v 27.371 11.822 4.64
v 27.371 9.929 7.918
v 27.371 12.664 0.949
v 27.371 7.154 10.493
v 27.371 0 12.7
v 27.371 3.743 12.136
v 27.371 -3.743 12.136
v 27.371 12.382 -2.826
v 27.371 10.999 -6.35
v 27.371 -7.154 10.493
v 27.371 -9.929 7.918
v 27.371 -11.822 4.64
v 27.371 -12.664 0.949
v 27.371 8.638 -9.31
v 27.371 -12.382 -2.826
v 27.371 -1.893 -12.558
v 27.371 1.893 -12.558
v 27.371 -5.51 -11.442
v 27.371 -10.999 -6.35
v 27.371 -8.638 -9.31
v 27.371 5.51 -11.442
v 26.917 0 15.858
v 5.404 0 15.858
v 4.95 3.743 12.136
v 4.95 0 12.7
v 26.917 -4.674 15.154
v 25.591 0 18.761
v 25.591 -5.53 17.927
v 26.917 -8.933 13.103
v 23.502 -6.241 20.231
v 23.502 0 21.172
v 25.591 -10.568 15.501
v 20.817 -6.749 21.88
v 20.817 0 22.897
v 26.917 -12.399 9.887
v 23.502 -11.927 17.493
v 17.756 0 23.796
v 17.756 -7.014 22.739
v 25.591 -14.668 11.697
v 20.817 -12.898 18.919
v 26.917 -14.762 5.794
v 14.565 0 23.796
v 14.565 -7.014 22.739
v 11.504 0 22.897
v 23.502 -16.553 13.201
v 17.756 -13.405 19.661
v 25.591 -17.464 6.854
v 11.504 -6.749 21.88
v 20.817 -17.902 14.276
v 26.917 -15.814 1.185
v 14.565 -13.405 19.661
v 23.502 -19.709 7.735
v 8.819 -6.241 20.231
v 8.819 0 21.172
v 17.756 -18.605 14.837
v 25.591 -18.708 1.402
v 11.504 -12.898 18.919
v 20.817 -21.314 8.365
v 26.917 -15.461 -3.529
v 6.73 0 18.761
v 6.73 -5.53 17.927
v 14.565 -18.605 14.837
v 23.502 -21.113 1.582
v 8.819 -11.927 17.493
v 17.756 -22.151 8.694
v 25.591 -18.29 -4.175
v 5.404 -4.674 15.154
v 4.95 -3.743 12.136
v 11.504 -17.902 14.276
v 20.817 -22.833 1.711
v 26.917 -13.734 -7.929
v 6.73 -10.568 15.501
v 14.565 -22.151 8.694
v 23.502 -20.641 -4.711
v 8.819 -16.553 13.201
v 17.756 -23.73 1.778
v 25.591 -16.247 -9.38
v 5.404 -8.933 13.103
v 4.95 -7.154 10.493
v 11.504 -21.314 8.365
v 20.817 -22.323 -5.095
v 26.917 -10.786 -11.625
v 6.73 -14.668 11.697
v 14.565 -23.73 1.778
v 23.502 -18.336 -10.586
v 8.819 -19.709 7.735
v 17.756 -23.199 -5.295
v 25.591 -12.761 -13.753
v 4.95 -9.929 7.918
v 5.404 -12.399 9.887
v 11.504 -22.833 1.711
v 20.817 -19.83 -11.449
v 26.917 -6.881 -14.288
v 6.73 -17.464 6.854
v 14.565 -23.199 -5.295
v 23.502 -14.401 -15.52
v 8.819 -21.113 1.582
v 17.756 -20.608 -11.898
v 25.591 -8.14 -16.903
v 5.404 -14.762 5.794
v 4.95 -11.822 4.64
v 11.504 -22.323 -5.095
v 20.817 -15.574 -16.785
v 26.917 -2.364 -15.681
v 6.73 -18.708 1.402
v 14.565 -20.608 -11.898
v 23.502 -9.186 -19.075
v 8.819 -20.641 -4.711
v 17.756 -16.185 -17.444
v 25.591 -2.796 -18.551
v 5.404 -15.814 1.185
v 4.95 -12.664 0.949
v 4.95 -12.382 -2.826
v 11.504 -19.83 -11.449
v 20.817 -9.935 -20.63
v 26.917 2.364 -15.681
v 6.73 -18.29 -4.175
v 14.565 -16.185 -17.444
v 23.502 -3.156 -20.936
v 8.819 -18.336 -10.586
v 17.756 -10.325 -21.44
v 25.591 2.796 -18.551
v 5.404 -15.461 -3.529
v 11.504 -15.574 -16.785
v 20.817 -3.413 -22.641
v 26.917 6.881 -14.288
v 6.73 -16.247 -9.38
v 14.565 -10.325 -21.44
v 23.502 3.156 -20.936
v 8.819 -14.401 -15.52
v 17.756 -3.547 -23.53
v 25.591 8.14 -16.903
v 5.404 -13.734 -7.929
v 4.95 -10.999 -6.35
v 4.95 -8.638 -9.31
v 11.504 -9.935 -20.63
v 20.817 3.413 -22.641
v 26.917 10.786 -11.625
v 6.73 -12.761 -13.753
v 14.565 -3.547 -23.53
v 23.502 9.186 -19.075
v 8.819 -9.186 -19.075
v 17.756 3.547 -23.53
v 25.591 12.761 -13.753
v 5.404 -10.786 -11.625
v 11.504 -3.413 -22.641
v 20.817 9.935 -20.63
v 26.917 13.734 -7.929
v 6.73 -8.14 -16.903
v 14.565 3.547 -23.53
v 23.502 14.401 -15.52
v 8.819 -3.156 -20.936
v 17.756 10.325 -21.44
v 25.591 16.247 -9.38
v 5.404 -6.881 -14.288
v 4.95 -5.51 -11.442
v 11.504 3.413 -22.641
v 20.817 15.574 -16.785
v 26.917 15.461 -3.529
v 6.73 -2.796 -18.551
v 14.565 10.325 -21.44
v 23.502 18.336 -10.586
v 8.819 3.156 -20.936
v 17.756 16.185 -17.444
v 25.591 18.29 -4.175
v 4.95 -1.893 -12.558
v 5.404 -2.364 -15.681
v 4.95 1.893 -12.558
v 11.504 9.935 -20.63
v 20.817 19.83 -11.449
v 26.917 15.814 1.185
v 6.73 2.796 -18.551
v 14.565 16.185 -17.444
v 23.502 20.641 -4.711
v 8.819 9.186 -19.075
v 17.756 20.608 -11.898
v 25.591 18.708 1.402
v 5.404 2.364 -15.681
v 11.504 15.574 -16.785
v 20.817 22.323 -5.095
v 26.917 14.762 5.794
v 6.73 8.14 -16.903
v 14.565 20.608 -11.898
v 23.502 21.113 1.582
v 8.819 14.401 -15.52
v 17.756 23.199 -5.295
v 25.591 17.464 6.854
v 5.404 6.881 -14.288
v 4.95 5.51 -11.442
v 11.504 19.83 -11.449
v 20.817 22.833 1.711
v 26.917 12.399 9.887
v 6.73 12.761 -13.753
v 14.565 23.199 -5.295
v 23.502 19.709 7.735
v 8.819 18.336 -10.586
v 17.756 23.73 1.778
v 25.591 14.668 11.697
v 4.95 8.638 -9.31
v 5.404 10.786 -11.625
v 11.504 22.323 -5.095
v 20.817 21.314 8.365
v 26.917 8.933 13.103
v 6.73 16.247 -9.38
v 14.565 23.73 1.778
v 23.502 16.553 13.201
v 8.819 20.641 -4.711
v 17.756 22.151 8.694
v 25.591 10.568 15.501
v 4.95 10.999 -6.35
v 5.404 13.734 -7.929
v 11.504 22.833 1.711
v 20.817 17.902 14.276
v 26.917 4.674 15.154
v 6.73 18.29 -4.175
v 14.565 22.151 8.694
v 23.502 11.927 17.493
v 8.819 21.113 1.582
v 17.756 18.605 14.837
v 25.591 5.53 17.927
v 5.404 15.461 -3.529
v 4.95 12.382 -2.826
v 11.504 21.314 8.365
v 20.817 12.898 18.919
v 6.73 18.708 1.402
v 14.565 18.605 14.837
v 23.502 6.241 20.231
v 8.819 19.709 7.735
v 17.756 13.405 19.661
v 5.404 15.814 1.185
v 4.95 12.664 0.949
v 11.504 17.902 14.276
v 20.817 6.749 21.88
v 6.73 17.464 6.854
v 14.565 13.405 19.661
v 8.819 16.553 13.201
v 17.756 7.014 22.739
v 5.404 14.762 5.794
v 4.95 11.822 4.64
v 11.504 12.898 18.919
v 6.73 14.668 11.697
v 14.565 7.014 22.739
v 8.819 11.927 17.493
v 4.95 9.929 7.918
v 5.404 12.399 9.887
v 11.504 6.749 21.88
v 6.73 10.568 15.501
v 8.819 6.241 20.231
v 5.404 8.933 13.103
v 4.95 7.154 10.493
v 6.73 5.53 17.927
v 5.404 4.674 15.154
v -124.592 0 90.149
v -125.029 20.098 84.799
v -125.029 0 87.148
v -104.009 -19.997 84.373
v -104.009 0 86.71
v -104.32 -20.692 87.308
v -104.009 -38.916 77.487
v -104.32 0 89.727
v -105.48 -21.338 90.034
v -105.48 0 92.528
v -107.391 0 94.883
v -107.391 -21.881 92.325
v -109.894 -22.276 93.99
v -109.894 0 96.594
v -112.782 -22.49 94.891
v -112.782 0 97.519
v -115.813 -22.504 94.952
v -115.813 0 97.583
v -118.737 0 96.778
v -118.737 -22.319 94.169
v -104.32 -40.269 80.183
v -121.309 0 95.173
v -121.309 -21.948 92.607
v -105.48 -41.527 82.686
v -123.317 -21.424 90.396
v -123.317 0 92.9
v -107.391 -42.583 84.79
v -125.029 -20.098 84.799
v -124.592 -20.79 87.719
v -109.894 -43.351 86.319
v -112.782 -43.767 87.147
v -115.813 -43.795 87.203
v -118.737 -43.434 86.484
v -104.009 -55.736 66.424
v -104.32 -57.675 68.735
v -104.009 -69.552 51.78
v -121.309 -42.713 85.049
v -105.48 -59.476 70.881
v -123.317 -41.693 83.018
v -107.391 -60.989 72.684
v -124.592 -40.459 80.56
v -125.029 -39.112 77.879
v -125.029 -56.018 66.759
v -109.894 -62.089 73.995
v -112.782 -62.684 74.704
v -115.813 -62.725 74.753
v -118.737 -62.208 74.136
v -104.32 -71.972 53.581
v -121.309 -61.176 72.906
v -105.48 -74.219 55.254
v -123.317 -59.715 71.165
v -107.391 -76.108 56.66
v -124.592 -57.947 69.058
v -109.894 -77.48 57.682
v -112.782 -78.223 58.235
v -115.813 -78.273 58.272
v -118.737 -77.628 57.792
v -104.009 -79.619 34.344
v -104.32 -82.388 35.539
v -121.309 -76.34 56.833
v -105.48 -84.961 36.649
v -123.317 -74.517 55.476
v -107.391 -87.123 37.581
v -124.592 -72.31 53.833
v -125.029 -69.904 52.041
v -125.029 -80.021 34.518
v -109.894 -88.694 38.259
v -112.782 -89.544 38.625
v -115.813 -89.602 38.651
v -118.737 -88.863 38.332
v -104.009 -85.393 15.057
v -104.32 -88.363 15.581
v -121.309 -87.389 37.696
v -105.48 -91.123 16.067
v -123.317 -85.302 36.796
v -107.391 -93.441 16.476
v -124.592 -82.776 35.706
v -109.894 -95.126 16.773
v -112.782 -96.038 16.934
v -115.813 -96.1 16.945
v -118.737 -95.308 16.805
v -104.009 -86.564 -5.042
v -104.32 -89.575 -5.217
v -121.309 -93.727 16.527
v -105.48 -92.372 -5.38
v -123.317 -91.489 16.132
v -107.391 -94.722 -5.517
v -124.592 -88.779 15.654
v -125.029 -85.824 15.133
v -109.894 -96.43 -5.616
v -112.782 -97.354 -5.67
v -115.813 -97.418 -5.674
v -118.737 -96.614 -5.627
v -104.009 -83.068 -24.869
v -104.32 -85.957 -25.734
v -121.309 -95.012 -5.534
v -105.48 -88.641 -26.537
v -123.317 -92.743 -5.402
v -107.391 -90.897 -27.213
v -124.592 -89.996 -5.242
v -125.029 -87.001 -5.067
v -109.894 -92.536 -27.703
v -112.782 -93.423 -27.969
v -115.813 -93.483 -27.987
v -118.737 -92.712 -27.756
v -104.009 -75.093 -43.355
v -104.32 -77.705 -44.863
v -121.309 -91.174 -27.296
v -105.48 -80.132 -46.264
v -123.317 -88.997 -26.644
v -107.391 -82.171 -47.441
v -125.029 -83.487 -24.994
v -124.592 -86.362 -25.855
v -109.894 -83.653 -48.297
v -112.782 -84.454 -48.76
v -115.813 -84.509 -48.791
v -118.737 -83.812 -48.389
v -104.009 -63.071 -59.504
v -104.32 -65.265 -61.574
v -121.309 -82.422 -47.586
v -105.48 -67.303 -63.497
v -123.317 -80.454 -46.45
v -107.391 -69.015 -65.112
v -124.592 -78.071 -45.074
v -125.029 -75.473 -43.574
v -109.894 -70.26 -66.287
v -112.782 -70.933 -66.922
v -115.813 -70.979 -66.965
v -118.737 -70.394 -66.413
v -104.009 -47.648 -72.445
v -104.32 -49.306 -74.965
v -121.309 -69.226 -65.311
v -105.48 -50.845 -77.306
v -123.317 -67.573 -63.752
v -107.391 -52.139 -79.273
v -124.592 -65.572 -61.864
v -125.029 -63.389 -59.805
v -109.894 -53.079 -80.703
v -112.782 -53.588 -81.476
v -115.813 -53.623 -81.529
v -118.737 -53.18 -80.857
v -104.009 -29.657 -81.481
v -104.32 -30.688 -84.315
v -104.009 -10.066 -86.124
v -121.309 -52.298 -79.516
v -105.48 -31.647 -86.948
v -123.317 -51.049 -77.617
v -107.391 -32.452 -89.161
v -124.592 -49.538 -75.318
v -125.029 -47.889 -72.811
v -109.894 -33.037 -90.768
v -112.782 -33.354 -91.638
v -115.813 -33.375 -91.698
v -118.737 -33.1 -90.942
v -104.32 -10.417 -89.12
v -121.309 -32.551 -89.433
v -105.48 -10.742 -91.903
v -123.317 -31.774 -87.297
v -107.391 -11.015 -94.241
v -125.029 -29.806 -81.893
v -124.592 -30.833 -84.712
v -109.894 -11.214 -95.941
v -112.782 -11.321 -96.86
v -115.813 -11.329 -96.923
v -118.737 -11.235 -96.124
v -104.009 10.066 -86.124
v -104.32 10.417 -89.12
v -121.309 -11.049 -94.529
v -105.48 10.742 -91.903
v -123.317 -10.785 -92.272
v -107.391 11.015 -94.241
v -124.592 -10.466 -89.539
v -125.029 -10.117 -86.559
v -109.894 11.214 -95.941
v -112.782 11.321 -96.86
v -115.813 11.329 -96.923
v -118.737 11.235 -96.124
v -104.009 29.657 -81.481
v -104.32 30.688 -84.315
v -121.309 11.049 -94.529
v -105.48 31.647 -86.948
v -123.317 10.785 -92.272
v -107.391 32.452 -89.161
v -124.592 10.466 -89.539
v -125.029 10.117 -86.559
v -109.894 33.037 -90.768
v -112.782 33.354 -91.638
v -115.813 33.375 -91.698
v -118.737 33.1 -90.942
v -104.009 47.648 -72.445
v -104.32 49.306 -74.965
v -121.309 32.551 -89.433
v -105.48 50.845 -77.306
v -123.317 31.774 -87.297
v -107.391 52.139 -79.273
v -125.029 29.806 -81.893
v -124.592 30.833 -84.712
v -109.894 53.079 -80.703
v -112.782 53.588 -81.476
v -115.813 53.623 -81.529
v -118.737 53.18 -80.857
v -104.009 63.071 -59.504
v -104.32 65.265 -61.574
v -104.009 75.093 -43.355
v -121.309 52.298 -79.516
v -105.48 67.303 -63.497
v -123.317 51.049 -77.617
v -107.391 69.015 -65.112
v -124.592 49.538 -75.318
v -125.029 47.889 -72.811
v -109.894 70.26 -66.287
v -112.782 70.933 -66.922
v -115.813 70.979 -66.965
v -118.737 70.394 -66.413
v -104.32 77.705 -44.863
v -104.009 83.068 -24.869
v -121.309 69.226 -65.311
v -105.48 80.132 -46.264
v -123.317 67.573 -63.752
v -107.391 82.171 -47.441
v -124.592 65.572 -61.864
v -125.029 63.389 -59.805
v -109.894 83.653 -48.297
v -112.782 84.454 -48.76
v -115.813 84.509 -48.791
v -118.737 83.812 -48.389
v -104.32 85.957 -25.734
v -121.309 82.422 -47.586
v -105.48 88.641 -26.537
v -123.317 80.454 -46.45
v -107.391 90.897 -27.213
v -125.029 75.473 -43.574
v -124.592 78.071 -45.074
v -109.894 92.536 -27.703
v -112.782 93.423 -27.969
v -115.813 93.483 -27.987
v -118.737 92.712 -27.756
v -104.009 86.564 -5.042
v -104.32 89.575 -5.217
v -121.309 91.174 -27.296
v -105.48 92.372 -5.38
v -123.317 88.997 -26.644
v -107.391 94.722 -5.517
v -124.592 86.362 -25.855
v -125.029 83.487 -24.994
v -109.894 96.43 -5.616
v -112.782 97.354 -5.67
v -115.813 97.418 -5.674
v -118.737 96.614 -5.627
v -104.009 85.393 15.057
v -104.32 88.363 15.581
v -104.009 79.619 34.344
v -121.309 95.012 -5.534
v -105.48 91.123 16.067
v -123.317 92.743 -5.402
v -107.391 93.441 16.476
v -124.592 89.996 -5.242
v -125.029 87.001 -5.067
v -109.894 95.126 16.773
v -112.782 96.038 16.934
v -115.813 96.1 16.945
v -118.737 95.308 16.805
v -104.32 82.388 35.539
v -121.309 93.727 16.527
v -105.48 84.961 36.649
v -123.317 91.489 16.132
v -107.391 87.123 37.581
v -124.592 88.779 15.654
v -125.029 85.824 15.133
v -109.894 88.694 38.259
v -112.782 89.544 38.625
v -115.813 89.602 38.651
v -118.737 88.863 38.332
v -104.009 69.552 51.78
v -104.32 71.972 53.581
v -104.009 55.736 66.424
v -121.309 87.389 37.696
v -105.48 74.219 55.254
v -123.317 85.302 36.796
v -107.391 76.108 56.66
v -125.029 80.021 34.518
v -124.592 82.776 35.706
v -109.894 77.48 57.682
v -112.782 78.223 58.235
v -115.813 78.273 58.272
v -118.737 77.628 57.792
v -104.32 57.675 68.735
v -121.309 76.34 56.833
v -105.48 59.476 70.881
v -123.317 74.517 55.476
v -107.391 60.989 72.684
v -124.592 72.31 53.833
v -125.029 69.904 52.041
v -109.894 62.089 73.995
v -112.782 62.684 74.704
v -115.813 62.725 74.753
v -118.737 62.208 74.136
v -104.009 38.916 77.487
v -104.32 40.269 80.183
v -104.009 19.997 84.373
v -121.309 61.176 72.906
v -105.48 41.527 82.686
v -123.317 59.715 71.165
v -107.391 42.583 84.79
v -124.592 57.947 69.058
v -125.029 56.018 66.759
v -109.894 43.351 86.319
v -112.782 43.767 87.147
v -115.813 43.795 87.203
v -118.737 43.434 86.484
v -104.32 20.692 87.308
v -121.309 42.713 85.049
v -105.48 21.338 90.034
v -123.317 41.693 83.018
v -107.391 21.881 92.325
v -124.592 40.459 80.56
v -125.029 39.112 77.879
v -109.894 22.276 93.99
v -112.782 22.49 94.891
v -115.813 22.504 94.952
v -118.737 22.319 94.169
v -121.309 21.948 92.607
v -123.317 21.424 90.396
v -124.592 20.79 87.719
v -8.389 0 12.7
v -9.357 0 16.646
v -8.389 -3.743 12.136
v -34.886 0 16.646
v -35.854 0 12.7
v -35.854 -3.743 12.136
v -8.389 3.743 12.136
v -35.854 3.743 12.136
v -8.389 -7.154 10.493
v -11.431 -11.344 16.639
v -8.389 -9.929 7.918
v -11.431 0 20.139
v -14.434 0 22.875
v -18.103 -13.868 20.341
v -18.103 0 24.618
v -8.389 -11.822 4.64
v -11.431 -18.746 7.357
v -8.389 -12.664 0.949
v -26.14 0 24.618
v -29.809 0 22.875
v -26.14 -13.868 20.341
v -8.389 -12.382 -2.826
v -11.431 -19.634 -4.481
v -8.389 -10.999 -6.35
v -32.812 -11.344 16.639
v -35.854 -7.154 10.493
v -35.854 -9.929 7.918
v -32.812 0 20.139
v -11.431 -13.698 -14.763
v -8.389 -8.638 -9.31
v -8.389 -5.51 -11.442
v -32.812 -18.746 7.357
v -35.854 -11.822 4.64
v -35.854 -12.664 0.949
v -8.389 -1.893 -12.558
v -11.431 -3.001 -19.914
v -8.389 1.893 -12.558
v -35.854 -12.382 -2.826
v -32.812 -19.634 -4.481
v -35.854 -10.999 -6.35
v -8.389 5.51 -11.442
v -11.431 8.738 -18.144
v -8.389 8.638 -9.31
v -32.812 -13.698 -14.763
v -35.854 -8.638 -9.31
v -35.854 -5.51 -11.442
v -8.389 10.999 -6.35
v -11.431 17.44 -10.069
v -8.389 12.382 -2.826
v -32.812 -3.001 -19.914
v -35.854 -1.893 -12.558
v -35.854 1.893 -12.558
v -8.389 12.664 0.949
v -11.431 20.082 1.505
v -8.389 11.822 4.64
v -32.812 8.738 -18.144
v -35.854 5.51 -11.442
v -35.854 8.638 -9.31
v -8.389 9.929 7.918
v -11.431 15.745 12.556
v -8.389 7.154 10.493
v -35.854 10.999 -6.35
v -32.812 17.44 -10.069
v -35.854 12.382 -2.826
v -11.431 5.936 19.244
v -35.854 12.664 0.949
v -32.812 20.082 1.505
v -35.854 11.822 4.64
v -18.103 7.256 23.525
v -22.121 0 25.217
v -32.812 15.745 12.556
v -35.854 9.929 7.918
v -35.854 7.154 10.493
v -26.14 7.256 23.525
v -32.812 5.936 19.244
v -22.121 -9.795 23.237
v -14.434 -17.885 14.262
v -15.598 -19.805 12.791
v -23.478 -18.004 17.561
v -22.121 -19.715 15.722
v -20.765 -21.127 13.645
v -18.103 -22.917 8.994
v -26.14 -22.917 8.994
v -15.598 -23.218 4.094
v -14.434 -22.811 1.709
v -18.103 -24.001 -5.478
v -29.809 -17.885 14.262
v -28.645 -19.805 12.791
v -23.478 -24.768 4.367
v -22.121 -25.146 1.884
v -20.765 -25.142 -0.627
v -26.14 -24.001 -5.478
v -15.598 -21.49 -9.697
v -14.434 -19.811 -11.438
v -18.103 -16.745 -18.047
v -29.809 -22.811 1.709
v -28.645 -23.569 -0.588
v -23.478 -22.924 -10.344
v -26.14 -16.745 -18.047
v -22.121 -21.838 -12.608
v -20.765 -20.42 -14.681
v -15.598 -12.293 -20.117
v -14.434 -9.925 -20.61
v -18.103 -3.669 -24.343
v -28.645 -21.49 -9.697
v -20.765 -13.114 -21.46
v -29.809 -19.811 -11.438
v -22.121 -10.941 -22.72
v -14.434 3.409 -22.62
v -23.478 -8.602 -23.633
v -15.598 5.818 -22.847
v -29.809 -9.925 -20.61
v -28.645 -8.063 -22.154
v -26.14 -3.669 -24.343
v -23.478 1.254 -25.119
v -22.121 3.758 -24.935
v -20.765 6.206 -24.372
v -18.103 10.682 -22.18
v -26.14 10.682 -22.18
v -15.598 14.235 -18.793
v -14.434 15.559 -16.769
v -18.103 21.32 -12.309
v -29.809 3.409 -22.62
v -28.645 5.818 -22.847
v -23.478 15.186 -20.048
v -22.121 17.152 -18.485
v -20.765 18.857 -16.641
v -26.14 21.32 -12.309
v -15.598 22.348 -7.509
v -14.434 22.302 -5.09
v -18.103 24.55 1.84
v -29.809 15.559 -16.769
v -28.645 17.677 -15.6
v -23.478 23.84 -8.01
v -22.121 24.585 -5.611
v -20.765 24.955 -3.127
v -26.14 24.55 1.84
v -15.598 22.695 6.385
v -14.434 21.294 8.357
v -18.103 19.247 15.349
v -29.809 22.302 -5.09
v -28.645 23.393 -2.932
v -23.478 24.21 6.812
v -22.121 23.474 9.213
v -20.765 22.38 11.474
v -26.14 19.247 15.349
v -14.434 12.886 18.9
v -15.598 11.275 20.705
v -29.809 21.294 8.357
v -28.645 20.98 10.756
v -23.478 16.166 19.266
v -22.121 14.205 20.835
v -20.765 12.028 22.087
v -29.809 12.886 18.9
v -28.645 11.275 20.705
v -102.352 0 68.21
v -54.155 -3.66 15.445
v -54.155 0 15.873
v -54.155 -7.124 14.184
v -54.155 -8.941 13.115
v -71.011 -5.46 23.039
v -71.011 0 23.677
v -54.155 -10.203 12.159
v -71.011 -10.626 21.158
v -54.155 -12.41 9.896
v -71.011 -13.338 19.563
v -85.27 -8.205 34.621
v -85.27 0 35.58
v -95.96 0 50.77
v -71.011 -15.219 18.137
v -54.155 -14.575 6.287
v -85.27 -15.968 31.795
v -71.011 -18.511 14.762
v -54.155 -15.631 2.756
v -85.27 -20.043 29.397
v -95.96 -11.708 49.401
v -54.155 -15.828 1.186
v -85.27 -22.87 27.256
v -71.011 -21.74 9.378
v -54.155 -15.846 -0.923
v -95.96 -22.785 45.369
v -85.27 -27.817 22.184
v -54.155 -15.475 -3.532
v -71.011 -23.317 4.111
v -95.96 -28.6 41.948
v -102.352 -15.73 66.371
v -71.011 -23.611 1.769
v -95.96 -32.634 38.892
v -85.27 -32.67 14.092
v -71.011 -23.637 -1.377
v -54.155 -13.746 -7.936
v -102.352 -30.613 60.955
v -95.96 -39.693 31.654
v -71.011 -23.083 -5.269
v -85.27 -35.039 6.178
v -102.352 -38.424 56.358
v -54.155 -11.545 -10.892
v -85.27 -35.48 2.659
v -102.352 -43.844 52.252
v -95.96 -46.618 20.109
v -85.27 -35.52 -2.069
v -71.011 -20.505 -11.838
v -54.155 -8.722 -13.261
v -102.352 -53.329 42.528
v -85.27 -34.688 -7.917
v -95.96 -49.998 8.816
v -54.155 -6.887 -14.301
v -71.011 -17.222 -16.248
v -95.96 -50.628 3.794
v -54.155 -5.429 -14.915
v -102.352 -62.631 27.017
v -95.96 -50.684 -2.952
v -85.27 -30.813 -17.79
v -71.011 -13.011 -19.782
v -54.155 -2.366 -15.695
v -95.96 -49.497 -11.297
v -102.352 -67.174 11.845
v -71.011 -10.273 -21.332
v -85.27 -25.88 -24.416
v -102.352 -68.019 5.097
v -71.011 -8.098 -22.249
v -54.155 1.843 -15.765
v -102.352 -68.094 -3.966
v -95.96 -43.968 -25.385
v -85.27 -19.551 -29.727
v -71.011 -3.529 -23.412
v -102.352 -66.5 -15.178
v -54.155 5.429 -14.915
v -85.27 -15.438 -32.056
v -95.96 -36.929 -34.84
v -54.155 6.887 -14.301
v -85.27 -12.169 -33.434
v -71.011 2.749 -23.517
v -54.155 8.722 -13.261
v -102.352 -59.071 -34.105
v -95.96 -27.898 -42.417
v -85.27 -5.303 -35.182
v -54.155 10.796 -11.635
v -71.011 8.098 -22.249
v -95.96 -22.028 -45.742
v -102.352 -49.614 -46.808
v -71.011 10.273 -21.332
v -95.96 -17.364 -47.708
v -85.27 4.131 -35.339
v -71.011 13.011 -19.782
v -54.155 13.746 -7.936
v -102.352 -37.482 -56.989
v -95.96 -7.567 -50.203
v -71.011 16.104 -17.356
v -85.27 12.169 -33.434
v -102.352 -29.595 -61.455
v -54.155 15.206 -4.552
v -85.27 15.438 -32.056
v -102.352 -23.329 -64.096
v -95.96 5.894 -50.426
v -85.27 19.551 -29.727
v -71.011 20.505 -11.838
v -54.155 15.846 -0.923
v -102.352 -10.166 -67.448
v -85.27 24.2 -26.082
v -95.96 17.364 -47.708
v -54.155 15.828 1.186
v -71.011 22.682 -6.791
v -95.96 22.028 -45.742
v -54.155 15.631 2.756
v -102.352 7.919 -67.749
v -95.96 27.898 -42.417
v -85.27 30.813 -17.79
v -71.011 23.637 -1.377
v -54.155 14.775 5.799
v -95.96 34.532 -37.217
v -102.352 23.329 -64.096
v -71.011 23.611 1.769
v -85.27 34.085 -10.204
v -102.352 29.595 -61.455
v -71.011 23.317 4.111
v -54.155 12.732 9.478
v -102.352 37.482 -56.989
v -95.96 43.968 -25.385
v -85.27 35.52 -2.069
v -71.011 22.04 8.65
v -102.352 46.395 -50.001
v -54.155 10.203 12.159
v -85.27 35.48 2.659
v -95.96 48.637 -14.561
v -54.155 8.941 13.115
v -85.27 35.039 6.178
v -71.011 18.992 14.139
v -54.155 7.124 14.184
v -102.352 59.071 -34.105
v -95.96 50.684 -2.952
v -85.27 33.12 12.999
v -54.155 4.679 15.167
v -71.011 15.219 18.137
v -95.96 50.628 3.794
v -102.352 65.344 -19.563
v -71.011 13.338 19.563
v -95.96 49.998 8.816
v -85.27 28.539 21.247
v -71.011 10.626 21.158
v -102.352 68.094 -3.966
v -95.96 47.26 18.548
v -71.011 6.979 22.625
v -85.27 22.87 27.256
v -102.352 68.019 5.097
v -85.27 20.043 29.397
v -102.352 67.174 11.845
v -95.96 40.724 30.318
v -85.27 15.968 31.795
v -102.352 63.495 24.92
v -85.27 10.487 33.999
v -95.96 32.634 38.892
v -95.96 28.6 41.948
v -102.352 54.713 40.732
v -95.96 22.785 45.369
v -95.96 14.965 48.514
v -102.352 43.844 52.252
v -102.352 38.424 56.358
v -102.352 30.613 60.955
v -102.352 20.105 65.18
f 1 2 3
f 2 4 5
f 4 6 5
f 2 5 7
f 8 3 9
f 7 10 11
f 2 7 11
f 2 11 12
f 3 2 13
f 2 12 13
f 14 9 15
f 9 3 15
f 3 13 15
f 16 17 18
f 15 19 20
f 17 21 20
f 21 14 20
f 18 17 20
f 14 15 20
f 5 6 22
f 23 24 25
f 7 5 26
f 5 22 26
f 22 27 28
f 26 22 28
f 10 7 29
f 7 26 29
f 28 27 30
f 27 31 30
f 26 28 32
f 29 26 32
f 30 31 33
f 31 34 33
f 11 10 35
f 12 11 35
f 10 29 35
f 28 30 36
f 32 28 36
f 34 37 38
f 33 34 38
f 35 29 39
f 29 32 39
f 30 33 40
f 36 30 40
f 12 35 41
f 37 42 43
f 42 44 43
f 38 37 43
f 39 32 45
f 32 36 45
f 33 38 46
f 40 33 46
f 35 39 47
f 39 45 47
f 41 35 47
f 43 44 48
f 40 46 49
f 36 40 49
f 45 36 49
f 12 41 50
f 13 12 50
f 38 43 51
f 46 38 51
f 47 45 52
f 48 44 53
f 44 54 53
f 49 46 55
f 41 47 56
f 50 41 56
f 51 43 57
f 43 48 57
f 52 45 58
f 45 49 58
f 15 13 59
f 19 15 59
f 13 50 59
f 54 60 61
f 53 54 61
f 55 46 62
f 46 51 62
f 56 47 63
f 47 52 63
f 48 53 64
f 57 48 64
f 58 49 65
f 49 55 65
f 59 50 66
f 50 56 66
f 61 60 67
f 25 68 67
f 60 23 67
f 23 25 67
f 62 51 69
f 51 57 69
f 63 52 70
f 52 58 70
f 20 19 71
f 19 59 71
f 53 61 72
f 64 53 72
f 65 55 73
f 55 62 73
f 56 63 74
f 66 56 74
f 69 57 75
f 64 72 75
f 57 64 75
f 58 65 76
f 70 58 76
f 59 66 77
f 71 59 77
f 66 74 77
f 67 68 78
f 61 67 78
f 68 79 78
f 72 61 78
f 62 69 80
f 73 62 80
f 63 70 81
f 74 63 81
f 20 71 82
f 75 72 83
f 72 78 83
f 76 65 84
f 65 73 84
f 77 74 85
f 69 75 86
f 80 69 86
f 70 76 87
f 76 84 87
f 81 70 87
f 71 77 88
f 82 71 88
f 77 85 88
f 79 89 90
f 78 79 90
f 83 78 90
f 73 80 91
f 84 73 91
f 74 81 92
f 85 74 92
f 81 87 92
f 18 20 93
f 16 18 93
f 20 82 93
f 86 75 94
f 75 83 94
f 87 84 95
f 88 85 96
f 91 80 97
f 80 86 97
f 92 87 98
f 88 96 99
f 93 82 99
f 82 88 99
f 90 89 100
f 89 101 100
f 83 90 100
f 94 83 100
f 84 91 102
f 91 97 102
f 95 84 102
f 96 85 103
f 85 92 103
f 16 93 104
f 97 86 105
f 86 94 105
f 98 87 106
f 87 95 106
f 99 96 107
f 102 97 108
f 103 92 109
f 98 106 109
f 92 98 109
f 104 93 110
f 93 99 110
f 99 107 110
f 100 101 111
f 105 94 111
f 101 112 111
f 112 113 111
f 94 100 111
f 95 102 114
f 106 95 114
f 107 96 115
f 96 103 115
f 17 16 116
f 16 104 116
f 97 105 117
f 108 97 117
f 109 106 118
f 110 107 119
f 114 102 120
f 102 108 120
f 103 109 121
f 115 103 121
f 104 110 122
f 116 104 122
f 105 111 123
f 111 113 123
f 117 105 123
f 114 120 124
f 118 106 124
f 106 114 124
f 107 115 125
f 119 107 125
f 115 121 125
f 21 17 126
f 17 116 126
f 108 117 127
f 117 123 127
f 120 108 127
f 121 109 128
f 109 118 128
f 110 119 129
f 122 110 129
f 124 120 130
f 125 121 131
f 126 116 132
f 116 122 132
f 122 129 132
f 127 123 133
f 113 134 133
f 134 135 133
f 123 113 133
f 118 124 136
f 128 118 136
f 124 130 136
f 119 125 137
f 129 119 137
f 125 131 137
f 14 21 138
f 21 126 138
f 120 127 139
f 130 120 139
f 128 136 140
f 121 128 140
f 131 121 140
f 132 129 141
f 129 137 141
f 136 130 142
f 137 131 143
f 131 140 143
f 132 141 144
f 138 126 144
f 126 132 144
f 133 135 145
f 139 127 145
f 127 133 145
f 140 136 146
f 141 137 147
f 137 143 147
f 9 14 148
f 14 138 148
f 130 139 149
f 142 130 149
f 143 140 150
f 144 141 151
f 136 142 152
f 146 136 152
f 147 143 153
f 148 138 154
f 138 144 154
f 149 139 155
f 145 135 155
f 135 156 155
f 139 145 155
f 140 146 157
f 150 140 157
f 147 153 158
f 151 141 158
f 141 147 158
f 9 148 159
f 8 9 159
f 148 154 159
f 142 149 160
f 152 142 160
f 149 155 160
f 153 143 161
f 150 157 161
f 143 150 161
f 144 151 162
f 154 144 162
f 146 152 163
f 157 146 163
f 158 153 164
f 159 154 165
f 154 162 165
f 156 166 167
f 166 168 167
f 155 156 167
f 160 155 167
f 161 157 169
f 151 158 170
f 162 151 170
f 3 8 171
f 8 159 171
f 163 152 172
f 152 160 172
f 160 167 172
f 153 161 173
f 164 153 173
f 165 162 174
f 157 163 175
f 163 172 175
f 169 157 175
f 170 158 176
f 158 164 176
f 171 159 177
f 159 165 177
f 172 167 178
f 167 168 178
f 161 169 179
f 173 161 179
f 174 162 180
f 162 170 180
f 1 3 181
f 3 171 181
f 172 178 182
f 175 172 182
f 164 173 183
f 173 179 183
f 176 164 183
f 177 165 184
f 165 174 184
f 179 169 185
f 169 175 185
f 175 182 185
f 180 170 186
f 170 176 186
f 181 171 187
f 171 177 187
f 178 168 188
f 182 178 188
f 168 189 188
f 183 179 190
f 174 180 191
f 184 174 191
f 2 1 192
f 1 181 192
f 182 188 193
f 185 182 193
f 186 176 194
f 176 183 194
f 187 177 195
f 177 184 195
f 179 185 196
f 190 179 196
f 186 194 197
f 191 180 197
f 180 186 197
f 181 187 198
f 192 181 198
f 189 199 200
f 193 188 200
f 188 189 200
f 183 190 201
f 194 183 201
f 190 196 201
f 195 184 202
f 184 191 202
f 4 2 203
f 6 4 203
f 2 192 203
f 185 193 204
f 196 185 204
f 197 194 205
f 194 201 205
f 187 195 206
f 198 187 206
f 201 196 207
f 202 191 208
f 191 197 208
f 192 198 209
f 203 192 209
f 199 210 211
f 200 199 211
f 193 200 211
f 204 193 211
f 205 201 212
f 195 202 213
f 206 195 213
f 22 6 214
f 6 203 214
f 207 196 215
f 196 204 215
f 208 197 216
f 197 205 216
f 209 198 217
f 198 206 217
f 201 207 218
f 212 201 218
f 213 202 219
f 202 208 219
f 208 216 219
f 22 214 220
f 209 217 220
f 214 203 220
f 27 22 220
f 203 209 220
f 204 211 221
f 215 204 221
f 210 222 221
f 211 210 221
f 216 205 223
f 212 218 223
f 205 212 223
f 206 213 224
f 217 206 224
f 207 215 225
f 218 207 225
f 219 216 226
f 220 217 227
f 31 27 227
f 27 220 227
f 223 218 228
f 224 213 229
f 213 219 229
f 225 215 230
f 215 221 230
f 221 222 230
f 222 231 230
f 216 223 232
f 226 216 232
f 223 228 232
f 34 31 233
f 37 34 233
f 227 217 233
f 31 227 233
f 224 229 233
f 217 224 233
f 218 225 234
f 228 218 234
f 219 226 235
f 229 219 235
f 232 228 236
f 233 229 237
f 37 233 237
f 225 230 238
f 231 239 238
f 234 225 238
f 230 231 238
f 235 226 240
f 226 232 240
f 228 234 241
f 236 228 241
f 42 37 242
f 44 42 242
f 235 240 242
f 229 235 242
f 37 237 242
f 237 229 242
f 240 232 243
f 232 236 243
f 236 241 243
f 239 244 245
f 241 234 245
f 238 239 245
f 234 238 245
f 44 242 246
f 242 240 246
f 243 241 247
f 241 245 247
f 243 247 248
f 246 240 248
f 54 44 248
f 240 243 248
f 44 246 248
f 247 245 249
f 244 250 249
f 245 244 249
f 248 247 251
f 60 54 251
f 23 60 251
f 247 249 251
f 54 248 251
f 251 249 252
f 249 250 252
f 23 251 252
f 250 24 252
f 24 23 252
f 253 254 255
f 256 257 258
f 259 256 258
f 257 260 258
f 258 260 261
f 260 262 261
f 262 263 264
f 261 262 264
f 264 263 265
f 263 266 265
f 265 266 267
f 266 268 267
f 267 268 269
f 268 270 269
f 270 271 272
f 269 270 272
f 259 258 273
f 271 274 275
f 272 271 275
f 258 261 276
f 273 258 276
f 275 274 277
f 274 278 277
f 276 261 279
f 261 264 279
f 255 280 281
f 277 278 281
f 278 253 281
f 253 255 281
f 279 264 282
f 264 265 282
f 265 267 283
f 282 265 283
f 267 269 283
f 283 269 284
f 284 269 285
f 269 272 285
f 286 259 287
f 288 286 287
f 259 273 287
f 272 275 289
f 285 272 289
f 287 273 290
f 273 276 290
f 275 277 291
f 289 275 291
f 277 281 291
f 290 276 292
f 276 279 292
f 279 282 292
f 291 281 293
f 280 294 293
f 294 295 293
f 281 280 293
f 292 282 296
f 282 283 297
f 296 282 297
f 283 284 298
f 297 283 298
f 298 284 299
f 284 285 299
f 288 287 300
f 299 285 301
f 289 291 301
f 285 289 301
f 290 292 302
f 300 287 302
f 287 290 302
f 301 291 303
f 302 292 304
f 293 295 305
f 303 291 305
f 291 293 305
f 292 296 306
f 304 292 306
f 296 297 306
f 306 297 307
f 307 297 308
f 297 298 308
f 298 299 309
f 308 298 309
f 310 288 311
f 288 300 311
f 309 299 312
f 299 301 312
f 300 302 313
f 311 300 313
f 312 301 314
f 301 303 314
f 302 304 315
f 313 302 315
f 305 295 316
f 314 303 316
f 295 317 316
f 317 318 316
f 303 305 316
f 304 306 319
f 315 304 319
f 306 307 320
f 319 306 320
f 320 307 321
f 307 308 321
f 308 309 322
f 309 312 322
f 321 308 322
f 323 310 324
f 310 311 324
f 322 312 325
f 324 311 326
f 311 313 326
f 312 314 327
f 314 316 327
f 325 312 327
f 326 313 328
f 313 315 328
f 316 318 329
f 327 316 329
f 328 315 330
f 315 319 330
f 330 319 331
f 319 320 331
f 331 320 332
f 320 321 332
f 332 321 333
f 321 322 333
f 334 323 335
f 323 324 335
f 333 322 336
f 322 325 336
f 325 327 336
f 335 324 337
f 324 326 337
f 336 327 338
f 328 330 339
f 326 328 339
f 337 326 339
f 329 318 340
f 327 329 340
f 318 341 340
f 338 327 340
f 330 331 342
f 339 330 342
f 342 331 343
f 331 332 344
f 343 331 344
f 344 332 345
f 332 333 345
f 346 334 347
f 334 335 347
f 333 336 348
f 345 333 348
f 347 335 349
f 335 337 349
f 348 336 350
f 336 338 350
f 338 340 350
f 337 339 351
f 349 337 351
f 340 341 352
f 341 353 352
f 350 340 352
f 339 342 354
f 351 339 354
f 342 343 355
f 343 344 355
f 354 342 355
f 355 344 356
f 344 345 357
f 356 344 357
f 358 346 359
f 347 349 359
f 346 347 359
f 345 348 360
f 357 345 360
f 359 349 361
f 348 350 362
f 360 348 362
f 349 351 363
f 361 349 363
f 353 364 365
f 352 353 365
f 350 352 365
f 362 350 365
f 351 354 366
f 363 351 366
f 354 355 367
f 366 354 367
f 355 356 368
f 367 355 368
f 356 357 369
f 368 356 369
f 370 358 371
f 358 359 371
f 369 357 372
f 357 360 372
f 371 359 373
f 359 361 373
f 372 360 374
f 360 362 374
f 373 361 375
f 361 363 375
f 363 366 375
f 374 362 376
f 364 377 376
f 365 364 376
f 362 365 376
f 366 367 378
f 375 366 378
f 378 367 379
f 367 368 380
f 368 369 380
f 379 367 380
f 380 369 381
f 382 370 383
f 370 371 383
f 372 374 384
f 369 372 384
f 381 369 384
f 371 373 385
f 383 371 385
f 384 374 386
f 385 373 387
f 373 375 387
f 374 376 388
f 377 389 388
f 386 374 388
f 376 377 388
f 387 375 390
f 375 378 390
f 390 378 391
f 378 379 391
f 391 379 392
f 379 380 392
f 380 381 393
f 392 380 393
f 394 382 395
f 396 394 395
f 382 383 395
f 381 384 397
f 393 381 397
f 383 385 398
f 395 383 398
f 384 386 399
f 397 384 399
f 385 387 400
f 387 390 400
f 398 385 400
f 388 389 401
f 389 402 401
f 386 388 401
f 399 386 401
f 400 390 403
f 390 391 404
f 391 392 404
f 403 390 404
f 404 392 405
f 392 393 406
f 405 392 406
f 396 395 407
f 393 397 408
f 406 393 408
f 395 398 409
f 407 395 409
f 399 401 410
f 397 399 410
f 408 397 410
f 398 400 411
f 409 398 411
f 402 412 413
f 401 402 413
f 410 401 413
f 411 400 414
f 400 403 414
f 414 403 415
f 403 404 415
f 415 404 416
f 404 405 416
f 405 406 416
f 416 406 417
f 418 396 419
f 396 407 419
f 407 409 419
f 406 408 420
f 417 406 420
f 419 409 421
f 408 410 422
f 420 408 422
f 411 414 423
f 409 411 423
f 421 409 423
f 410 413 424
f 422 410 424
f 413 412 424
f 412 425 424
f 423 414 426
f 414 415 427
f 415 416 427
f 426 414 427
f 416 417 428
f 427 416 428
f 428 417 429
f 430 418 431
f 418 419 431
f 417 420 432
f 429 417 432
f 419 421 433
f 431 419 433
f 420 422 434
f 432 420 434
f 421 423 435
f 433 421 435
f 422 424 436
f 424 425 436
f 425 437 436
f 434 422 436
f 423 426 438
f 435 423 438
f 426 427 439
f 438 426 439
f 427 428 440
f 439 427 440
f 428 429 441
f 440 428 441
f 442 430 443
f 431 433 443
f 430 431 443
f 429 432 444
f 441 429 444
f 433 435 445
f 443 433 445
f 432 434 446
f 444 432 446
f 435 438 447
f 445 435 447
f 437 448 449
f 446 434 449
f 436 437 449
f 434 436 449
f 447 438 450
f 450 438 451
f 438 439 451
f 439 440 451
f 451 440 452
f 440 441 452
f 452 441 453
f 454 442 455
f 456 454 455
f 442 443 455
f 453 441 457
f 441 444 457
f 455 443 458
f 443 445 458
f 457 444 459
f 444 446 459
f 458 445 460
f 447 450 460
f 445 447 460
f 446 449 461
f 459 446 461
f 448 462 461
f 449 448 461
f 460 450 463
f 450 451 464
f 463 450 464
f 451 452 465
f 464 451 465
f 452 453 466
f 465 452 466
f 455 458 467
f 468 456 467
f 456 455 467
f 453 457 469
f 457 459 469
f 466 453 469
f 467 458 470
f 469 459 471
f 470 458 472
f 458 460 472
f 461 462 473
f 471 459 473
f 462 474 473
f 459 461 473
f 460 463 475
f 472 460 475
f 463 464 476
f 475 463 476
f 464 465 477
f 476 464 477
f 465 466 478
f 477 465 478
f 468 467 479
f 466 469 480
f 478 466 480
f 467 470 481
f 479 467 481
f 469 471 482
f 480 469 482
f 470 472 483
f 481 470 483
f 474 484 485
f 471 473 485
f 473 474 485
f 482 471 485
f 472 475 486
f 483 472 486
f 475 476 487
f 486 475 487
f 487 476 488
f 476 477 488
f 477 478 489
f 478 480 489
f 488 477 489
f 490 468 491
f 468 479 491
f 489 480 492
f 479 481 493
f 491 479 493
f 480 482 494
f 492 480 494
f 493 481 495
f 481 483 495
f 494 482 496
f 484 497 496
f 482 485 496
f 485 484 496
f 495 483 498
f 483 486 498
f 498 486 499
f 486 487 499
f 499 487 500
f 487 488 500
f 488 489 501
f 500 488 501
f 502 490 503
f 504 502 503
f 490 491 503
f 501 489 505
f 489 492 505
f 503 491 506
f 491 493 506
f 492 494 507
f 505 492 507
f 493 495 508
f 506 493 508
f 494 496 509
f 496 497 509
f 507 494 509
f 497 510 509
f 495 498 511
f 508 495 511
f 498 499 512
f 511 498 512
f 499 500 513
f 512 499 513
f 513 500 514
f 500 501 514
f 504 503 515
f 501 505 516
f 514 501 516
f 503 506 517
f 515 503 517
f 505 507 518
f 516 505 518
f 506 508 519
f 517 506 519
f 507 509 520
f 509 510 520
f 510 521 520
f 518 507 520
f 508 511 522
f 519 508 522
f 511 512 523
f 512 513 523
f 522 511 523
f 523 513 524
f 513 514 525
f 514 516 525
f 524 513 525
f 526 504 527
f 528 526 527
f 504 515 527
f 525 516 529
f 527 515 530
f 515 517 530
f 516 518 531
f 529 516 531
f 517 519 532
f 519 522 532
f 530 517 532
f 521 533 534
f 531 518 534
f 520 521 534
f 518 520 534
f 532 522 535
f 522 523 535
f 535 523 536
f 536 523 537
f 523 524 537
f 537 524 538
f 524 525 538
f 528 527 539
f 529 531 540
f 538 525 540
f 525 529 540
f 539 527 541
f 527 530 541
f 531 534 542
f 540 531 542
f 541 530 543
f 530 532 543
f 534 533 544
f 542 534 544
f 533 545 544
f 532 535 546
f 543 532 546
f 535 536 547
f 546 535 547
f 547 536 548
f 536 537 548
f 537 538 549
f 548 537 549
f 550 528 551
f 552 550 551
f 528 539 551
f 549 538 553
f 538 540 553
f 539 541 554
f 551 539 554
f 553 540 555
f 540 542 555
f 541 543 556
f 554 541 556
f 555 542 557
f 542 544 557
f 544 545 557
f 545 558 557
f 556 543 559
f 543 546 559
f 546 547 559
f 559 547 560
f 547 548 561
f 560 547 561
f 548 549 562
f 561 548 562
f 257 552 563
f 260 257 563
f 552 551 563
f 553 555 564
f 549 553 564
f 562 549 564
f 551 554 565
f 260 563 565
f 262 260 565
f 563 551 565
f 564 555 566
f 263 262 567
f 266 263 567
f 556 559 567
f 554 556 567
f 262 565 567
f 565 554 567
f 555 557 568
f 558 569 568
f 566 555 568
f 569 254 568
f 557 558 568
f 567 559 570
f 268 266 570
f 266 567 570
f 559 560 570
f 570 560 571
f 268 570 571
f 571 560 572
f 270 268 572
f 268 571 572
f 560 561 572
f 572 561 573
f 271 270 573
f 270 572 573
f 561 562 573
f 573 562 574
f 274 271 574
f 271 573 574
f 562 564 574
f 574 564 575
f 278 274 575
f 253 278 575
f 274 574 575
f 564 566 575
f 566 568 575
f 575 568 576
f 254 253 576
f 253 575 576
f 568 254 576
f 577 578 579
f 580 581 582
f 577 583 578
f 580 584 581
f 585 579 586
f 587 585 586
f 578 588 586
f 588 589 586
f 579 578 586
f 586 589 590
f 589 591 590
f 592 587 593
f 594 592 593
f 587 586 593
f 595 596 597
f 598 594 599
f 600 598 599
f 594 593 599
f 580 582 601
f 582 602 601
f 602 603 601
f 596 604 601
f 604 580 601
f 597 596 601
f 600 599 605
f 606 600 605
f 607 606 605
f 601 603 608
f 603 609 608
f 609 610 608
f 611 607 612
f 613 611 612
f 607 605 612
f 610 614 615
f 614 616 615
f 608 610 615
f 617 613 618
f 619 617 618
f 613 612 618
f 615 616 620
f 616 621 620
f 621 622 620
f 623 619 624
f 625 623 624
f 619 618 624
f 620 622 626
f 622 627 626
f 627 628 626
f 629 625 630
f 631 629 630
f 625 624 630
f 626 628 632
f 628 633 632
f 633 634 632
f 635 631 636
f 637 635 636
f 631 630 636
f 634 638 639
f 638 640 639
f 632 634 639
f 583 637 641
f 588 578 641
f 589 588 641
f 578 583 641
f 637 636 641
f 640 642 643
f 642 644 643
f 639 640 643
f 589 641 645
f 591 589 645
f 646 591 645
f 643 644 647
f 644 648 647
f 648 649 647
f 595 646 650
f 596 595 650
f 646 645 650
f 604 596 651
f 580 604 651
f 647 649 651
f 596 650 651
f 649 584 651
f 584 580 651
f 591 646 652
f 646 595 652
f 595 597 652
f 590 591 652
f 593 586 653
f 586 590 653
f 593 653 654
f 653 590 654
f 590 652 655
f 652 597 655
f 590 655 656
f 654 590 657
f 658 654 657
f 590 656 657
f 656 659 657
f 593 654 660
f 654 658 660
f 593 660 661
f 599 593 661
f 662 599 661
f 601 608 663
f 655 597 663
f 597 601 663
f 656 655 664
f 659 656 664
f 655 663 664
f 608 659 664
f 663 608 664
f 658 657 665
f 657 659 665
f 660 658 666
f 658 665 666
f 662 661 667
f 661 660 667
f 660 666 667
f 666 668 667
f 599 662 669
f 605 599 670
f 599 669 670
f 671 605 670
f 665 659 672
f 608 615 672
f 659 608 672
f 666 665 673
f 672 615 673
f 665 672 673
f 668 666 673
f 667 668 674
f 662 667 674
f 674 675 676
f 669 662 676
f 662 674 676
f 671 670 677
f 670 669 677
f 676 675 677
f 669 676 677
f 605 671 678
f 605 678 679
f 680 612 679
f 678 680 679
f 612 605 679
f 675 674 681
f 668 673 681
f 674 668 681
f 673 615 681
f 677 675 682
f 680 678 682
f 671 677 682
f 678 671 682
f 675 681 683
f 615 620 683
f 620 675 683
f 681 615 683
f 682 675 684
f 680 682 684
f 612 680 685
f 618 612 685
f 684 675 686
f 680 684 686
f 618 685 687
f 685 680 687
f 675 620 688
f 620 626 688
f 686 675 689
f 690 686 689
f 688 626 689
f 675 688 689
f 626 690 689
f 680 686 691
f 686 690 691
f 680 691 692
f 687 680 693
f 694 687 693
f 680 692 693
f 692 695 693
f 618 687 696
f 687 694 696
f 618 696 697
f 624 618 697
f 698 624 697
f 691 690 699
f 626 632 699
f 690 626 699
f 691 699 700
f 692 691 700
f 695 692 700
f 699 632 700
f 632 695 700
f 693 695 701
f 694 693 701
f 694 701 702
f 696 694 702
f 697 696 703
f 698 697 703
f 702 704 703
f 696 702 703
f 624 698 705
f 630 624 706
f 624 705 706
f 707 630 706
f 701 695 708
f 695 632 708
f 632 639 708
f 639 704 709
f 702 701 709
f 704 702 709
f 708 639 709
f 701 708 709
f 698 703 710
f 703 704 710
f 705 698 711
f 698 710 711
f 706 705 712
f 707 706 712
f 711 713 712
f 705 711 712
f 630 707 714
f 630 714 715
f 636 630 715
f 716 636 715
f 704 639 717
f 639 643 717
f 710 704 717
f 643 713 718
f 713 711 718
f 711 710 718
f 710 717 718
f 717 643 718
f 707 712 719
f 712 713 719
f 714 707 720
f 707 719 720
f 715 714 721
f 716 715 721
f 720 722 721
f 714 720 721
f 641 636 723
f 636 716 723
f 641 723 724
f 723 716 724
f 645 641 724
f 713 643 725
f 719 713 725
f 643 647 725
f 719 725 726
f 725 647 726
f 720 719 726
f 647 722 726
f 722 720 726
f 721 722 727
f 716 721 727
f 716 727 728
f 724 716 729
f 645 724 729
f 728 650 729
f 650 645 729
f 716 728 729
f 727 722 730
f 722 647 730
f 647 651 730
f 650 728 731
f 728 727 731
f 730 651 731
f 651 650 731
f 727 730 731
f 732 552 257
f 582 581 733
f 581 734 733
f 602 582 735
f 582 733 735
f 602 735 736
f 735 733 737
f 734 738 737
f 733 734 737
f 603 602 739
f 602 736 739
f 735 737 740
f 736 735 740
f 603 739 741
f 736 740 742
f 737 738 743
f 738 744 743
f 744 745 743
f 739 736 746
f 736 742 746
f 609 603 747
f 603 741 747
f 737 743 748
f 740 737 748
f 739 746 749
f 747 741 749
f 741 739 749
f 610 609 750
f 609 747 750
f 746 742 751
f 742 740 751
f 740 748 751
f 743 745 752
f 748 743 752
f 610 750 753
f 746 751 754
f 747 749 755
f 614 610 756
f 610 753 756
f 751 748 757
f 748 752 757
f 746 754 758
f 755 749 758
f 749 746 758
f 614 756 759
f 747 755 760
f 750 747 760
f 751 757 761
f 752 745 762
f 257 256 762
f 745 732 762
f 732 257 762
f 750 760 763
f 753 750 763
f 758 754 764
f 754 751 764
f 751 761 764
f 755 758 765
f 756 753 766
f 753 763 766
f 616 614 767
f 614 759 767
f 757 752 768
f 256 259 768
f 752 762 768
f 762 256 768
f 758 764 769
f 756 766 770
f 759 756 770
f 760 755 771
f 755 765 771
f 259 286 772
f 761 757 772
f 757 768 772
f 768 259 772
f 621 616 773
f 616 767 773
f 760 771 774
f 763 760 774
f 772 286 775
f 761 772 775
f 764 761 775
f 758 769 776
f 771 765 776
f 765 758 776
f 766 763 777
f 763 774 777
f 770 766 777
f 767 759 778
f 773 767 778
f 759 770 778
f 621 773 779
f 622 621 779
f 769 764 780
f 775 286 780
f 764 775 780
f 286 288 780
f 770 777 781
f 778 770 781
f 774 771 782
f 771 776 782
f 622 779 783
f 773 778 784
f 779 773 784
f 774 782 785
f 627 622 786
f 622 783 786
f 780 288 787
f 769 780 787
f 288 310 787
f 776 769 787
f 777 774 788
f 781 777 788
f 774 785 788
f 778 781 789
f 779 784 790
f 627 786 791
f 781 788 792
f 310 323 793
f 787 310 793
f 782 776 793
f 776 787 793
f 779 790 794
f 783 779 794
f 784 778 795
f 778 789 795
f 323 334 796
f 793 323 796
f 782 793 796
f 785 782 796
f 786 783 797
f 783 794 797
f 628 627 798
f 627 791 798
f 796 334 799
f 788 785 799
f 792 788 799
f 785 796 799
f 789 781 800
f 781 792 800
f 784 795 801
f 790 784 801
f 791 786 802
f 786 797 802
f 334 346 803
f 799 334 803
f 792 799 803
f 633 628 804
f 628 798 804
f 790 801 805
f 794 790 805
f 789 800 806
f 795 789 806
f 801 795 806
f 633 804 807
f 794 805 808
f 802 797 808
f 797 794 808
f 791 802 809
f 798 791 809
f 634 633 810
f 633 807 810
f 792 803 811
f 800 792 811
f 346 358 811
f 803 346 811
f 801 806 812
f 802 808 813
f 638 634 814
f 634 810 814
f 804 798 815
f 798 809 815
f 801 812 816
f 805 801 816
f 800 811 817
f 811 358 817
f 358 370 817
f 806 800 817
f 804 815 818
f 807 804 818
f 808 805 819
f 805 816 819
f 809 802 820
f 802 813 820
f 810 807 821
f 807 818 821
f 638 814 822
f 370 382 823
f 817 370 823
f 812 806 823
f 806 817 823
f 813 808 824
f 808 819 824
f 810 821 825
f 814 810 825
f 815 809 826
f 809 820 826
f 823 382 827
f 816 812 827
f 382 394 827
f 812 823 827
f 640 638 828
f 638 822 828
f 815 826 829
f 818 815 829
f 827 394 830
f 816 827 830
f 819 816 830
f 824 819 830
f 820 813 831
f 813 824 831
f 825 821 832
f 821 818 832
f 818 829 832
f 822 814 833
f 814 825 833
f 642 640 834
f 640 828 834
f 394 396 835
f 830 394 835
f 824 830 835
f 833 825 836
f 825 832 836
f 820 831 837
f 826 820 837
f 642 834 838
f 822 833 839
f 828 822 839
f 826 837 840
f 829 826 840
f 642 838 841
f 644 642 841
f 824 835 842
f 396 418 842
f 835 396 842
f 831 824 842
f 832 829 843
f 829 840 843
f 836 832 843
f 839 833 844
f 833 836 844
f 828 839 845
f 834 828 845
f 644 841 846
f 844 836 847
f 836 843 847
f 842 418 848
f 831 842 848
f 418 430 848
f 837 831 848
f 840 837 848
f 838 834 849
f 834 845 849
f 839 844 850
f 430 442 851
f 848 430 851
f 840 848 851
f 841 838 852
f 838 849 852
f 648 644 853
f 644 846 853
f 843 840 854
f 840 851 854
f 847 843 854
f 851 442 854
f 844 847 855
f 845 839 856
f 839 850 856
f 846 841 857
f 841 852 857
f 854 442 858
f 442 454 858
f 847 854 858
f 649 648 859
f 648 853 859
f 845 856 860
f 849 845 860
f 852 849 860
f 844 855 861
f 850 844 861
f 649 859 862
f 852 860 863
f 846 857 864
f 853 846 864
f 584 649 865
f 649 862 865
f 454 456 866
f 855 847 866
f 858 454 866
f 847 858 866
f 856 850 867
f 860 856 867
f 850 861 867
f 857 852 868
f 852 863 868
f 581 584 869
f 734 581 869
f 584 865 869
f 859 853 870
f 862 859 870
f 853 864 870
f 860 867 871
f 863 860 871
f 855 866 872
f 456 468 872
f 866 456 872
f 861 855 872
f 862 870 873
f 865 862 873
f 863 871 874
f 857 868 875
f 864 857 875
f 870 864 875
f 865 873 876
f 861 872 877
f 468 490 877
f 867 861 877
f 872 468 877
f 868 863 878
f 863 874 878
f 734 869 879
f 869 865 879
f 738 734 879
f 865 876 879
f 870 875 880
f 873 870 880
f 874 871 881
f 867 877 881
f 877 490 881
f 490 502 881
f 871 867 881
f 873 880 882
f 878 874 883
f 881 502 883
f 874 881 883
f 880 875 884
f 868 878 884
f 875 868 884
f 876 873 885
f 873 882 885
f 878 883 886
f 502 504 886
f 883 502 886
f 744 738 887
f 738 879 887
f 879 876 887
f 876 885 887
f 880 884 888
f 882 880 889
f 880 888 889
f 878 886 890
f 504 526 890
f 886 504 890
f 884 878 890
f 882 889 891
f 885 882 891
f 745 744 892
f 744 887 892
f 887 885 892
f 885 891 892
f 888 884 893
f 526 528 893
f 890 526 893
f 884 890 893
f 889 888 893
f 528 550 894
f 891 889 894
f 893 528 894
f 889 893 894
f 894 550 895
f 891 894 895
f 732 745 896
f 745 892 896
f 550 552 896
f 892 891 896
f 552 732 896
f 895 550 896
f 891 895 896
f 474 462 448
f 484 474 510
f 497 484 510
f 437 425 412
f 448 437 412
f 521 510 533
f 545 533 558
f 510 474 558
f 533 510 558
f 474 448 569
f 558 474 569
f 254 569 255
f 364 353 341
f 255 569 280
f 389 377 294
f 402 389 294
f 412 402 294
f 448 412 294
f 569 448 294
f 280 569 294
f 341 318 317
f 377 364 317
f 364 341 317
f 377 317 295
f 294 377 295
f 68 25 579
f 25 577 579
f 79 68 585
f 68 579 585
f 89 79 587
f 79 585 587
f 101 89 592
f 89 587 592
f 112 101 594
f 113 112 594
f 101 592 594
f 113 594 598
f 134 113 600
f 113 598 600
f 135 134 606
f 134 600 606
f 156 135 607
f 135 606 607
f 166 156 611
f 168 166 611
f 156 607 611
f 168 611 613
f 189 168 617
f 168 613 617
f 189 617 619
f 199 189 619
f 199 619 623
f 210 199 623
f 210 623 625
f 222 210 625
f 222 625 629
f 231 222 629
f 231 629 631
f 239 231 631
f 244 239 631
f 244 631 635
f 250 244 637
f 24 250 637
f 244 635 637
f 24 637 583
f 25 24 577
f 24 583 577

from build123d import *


with BuildPart() as f1:
    # F0 (on Front) → F1 (revolve)
    with BuildSketch(Plane.XZ):
        with BuildLine():
            Line((-125.029312, 87.148277), (-125.029312, 0))
            Line((-125.029312, 0), (27.370688, 0))
            Line((27.370688, 0), (27.370688, 12.7))
            ThreePointArc((27.370688, 12.7), (16.160477, 23.910211), (4.950266, 12.7))
            Line((4.950266, 12.7), (-8.389435, 12.7))
            ThreePointArc((-8.389435, 12.7), (-22.121487, 25.216773), (-35.853539, 12.7))
            ThreePointArc((-35.853539, 12.7), (-85.269927, 35.579841), (-104.008624, 86.710339))
            ThreePointArc((-104.008624, 86.710339), (-114.29539, 97.660902), (-125.029312, 87.148277))
        make_face()
    revolve(axis=Axis((-48.829312, 0, 0), (1, 0, 0)))


solid = f1.part
